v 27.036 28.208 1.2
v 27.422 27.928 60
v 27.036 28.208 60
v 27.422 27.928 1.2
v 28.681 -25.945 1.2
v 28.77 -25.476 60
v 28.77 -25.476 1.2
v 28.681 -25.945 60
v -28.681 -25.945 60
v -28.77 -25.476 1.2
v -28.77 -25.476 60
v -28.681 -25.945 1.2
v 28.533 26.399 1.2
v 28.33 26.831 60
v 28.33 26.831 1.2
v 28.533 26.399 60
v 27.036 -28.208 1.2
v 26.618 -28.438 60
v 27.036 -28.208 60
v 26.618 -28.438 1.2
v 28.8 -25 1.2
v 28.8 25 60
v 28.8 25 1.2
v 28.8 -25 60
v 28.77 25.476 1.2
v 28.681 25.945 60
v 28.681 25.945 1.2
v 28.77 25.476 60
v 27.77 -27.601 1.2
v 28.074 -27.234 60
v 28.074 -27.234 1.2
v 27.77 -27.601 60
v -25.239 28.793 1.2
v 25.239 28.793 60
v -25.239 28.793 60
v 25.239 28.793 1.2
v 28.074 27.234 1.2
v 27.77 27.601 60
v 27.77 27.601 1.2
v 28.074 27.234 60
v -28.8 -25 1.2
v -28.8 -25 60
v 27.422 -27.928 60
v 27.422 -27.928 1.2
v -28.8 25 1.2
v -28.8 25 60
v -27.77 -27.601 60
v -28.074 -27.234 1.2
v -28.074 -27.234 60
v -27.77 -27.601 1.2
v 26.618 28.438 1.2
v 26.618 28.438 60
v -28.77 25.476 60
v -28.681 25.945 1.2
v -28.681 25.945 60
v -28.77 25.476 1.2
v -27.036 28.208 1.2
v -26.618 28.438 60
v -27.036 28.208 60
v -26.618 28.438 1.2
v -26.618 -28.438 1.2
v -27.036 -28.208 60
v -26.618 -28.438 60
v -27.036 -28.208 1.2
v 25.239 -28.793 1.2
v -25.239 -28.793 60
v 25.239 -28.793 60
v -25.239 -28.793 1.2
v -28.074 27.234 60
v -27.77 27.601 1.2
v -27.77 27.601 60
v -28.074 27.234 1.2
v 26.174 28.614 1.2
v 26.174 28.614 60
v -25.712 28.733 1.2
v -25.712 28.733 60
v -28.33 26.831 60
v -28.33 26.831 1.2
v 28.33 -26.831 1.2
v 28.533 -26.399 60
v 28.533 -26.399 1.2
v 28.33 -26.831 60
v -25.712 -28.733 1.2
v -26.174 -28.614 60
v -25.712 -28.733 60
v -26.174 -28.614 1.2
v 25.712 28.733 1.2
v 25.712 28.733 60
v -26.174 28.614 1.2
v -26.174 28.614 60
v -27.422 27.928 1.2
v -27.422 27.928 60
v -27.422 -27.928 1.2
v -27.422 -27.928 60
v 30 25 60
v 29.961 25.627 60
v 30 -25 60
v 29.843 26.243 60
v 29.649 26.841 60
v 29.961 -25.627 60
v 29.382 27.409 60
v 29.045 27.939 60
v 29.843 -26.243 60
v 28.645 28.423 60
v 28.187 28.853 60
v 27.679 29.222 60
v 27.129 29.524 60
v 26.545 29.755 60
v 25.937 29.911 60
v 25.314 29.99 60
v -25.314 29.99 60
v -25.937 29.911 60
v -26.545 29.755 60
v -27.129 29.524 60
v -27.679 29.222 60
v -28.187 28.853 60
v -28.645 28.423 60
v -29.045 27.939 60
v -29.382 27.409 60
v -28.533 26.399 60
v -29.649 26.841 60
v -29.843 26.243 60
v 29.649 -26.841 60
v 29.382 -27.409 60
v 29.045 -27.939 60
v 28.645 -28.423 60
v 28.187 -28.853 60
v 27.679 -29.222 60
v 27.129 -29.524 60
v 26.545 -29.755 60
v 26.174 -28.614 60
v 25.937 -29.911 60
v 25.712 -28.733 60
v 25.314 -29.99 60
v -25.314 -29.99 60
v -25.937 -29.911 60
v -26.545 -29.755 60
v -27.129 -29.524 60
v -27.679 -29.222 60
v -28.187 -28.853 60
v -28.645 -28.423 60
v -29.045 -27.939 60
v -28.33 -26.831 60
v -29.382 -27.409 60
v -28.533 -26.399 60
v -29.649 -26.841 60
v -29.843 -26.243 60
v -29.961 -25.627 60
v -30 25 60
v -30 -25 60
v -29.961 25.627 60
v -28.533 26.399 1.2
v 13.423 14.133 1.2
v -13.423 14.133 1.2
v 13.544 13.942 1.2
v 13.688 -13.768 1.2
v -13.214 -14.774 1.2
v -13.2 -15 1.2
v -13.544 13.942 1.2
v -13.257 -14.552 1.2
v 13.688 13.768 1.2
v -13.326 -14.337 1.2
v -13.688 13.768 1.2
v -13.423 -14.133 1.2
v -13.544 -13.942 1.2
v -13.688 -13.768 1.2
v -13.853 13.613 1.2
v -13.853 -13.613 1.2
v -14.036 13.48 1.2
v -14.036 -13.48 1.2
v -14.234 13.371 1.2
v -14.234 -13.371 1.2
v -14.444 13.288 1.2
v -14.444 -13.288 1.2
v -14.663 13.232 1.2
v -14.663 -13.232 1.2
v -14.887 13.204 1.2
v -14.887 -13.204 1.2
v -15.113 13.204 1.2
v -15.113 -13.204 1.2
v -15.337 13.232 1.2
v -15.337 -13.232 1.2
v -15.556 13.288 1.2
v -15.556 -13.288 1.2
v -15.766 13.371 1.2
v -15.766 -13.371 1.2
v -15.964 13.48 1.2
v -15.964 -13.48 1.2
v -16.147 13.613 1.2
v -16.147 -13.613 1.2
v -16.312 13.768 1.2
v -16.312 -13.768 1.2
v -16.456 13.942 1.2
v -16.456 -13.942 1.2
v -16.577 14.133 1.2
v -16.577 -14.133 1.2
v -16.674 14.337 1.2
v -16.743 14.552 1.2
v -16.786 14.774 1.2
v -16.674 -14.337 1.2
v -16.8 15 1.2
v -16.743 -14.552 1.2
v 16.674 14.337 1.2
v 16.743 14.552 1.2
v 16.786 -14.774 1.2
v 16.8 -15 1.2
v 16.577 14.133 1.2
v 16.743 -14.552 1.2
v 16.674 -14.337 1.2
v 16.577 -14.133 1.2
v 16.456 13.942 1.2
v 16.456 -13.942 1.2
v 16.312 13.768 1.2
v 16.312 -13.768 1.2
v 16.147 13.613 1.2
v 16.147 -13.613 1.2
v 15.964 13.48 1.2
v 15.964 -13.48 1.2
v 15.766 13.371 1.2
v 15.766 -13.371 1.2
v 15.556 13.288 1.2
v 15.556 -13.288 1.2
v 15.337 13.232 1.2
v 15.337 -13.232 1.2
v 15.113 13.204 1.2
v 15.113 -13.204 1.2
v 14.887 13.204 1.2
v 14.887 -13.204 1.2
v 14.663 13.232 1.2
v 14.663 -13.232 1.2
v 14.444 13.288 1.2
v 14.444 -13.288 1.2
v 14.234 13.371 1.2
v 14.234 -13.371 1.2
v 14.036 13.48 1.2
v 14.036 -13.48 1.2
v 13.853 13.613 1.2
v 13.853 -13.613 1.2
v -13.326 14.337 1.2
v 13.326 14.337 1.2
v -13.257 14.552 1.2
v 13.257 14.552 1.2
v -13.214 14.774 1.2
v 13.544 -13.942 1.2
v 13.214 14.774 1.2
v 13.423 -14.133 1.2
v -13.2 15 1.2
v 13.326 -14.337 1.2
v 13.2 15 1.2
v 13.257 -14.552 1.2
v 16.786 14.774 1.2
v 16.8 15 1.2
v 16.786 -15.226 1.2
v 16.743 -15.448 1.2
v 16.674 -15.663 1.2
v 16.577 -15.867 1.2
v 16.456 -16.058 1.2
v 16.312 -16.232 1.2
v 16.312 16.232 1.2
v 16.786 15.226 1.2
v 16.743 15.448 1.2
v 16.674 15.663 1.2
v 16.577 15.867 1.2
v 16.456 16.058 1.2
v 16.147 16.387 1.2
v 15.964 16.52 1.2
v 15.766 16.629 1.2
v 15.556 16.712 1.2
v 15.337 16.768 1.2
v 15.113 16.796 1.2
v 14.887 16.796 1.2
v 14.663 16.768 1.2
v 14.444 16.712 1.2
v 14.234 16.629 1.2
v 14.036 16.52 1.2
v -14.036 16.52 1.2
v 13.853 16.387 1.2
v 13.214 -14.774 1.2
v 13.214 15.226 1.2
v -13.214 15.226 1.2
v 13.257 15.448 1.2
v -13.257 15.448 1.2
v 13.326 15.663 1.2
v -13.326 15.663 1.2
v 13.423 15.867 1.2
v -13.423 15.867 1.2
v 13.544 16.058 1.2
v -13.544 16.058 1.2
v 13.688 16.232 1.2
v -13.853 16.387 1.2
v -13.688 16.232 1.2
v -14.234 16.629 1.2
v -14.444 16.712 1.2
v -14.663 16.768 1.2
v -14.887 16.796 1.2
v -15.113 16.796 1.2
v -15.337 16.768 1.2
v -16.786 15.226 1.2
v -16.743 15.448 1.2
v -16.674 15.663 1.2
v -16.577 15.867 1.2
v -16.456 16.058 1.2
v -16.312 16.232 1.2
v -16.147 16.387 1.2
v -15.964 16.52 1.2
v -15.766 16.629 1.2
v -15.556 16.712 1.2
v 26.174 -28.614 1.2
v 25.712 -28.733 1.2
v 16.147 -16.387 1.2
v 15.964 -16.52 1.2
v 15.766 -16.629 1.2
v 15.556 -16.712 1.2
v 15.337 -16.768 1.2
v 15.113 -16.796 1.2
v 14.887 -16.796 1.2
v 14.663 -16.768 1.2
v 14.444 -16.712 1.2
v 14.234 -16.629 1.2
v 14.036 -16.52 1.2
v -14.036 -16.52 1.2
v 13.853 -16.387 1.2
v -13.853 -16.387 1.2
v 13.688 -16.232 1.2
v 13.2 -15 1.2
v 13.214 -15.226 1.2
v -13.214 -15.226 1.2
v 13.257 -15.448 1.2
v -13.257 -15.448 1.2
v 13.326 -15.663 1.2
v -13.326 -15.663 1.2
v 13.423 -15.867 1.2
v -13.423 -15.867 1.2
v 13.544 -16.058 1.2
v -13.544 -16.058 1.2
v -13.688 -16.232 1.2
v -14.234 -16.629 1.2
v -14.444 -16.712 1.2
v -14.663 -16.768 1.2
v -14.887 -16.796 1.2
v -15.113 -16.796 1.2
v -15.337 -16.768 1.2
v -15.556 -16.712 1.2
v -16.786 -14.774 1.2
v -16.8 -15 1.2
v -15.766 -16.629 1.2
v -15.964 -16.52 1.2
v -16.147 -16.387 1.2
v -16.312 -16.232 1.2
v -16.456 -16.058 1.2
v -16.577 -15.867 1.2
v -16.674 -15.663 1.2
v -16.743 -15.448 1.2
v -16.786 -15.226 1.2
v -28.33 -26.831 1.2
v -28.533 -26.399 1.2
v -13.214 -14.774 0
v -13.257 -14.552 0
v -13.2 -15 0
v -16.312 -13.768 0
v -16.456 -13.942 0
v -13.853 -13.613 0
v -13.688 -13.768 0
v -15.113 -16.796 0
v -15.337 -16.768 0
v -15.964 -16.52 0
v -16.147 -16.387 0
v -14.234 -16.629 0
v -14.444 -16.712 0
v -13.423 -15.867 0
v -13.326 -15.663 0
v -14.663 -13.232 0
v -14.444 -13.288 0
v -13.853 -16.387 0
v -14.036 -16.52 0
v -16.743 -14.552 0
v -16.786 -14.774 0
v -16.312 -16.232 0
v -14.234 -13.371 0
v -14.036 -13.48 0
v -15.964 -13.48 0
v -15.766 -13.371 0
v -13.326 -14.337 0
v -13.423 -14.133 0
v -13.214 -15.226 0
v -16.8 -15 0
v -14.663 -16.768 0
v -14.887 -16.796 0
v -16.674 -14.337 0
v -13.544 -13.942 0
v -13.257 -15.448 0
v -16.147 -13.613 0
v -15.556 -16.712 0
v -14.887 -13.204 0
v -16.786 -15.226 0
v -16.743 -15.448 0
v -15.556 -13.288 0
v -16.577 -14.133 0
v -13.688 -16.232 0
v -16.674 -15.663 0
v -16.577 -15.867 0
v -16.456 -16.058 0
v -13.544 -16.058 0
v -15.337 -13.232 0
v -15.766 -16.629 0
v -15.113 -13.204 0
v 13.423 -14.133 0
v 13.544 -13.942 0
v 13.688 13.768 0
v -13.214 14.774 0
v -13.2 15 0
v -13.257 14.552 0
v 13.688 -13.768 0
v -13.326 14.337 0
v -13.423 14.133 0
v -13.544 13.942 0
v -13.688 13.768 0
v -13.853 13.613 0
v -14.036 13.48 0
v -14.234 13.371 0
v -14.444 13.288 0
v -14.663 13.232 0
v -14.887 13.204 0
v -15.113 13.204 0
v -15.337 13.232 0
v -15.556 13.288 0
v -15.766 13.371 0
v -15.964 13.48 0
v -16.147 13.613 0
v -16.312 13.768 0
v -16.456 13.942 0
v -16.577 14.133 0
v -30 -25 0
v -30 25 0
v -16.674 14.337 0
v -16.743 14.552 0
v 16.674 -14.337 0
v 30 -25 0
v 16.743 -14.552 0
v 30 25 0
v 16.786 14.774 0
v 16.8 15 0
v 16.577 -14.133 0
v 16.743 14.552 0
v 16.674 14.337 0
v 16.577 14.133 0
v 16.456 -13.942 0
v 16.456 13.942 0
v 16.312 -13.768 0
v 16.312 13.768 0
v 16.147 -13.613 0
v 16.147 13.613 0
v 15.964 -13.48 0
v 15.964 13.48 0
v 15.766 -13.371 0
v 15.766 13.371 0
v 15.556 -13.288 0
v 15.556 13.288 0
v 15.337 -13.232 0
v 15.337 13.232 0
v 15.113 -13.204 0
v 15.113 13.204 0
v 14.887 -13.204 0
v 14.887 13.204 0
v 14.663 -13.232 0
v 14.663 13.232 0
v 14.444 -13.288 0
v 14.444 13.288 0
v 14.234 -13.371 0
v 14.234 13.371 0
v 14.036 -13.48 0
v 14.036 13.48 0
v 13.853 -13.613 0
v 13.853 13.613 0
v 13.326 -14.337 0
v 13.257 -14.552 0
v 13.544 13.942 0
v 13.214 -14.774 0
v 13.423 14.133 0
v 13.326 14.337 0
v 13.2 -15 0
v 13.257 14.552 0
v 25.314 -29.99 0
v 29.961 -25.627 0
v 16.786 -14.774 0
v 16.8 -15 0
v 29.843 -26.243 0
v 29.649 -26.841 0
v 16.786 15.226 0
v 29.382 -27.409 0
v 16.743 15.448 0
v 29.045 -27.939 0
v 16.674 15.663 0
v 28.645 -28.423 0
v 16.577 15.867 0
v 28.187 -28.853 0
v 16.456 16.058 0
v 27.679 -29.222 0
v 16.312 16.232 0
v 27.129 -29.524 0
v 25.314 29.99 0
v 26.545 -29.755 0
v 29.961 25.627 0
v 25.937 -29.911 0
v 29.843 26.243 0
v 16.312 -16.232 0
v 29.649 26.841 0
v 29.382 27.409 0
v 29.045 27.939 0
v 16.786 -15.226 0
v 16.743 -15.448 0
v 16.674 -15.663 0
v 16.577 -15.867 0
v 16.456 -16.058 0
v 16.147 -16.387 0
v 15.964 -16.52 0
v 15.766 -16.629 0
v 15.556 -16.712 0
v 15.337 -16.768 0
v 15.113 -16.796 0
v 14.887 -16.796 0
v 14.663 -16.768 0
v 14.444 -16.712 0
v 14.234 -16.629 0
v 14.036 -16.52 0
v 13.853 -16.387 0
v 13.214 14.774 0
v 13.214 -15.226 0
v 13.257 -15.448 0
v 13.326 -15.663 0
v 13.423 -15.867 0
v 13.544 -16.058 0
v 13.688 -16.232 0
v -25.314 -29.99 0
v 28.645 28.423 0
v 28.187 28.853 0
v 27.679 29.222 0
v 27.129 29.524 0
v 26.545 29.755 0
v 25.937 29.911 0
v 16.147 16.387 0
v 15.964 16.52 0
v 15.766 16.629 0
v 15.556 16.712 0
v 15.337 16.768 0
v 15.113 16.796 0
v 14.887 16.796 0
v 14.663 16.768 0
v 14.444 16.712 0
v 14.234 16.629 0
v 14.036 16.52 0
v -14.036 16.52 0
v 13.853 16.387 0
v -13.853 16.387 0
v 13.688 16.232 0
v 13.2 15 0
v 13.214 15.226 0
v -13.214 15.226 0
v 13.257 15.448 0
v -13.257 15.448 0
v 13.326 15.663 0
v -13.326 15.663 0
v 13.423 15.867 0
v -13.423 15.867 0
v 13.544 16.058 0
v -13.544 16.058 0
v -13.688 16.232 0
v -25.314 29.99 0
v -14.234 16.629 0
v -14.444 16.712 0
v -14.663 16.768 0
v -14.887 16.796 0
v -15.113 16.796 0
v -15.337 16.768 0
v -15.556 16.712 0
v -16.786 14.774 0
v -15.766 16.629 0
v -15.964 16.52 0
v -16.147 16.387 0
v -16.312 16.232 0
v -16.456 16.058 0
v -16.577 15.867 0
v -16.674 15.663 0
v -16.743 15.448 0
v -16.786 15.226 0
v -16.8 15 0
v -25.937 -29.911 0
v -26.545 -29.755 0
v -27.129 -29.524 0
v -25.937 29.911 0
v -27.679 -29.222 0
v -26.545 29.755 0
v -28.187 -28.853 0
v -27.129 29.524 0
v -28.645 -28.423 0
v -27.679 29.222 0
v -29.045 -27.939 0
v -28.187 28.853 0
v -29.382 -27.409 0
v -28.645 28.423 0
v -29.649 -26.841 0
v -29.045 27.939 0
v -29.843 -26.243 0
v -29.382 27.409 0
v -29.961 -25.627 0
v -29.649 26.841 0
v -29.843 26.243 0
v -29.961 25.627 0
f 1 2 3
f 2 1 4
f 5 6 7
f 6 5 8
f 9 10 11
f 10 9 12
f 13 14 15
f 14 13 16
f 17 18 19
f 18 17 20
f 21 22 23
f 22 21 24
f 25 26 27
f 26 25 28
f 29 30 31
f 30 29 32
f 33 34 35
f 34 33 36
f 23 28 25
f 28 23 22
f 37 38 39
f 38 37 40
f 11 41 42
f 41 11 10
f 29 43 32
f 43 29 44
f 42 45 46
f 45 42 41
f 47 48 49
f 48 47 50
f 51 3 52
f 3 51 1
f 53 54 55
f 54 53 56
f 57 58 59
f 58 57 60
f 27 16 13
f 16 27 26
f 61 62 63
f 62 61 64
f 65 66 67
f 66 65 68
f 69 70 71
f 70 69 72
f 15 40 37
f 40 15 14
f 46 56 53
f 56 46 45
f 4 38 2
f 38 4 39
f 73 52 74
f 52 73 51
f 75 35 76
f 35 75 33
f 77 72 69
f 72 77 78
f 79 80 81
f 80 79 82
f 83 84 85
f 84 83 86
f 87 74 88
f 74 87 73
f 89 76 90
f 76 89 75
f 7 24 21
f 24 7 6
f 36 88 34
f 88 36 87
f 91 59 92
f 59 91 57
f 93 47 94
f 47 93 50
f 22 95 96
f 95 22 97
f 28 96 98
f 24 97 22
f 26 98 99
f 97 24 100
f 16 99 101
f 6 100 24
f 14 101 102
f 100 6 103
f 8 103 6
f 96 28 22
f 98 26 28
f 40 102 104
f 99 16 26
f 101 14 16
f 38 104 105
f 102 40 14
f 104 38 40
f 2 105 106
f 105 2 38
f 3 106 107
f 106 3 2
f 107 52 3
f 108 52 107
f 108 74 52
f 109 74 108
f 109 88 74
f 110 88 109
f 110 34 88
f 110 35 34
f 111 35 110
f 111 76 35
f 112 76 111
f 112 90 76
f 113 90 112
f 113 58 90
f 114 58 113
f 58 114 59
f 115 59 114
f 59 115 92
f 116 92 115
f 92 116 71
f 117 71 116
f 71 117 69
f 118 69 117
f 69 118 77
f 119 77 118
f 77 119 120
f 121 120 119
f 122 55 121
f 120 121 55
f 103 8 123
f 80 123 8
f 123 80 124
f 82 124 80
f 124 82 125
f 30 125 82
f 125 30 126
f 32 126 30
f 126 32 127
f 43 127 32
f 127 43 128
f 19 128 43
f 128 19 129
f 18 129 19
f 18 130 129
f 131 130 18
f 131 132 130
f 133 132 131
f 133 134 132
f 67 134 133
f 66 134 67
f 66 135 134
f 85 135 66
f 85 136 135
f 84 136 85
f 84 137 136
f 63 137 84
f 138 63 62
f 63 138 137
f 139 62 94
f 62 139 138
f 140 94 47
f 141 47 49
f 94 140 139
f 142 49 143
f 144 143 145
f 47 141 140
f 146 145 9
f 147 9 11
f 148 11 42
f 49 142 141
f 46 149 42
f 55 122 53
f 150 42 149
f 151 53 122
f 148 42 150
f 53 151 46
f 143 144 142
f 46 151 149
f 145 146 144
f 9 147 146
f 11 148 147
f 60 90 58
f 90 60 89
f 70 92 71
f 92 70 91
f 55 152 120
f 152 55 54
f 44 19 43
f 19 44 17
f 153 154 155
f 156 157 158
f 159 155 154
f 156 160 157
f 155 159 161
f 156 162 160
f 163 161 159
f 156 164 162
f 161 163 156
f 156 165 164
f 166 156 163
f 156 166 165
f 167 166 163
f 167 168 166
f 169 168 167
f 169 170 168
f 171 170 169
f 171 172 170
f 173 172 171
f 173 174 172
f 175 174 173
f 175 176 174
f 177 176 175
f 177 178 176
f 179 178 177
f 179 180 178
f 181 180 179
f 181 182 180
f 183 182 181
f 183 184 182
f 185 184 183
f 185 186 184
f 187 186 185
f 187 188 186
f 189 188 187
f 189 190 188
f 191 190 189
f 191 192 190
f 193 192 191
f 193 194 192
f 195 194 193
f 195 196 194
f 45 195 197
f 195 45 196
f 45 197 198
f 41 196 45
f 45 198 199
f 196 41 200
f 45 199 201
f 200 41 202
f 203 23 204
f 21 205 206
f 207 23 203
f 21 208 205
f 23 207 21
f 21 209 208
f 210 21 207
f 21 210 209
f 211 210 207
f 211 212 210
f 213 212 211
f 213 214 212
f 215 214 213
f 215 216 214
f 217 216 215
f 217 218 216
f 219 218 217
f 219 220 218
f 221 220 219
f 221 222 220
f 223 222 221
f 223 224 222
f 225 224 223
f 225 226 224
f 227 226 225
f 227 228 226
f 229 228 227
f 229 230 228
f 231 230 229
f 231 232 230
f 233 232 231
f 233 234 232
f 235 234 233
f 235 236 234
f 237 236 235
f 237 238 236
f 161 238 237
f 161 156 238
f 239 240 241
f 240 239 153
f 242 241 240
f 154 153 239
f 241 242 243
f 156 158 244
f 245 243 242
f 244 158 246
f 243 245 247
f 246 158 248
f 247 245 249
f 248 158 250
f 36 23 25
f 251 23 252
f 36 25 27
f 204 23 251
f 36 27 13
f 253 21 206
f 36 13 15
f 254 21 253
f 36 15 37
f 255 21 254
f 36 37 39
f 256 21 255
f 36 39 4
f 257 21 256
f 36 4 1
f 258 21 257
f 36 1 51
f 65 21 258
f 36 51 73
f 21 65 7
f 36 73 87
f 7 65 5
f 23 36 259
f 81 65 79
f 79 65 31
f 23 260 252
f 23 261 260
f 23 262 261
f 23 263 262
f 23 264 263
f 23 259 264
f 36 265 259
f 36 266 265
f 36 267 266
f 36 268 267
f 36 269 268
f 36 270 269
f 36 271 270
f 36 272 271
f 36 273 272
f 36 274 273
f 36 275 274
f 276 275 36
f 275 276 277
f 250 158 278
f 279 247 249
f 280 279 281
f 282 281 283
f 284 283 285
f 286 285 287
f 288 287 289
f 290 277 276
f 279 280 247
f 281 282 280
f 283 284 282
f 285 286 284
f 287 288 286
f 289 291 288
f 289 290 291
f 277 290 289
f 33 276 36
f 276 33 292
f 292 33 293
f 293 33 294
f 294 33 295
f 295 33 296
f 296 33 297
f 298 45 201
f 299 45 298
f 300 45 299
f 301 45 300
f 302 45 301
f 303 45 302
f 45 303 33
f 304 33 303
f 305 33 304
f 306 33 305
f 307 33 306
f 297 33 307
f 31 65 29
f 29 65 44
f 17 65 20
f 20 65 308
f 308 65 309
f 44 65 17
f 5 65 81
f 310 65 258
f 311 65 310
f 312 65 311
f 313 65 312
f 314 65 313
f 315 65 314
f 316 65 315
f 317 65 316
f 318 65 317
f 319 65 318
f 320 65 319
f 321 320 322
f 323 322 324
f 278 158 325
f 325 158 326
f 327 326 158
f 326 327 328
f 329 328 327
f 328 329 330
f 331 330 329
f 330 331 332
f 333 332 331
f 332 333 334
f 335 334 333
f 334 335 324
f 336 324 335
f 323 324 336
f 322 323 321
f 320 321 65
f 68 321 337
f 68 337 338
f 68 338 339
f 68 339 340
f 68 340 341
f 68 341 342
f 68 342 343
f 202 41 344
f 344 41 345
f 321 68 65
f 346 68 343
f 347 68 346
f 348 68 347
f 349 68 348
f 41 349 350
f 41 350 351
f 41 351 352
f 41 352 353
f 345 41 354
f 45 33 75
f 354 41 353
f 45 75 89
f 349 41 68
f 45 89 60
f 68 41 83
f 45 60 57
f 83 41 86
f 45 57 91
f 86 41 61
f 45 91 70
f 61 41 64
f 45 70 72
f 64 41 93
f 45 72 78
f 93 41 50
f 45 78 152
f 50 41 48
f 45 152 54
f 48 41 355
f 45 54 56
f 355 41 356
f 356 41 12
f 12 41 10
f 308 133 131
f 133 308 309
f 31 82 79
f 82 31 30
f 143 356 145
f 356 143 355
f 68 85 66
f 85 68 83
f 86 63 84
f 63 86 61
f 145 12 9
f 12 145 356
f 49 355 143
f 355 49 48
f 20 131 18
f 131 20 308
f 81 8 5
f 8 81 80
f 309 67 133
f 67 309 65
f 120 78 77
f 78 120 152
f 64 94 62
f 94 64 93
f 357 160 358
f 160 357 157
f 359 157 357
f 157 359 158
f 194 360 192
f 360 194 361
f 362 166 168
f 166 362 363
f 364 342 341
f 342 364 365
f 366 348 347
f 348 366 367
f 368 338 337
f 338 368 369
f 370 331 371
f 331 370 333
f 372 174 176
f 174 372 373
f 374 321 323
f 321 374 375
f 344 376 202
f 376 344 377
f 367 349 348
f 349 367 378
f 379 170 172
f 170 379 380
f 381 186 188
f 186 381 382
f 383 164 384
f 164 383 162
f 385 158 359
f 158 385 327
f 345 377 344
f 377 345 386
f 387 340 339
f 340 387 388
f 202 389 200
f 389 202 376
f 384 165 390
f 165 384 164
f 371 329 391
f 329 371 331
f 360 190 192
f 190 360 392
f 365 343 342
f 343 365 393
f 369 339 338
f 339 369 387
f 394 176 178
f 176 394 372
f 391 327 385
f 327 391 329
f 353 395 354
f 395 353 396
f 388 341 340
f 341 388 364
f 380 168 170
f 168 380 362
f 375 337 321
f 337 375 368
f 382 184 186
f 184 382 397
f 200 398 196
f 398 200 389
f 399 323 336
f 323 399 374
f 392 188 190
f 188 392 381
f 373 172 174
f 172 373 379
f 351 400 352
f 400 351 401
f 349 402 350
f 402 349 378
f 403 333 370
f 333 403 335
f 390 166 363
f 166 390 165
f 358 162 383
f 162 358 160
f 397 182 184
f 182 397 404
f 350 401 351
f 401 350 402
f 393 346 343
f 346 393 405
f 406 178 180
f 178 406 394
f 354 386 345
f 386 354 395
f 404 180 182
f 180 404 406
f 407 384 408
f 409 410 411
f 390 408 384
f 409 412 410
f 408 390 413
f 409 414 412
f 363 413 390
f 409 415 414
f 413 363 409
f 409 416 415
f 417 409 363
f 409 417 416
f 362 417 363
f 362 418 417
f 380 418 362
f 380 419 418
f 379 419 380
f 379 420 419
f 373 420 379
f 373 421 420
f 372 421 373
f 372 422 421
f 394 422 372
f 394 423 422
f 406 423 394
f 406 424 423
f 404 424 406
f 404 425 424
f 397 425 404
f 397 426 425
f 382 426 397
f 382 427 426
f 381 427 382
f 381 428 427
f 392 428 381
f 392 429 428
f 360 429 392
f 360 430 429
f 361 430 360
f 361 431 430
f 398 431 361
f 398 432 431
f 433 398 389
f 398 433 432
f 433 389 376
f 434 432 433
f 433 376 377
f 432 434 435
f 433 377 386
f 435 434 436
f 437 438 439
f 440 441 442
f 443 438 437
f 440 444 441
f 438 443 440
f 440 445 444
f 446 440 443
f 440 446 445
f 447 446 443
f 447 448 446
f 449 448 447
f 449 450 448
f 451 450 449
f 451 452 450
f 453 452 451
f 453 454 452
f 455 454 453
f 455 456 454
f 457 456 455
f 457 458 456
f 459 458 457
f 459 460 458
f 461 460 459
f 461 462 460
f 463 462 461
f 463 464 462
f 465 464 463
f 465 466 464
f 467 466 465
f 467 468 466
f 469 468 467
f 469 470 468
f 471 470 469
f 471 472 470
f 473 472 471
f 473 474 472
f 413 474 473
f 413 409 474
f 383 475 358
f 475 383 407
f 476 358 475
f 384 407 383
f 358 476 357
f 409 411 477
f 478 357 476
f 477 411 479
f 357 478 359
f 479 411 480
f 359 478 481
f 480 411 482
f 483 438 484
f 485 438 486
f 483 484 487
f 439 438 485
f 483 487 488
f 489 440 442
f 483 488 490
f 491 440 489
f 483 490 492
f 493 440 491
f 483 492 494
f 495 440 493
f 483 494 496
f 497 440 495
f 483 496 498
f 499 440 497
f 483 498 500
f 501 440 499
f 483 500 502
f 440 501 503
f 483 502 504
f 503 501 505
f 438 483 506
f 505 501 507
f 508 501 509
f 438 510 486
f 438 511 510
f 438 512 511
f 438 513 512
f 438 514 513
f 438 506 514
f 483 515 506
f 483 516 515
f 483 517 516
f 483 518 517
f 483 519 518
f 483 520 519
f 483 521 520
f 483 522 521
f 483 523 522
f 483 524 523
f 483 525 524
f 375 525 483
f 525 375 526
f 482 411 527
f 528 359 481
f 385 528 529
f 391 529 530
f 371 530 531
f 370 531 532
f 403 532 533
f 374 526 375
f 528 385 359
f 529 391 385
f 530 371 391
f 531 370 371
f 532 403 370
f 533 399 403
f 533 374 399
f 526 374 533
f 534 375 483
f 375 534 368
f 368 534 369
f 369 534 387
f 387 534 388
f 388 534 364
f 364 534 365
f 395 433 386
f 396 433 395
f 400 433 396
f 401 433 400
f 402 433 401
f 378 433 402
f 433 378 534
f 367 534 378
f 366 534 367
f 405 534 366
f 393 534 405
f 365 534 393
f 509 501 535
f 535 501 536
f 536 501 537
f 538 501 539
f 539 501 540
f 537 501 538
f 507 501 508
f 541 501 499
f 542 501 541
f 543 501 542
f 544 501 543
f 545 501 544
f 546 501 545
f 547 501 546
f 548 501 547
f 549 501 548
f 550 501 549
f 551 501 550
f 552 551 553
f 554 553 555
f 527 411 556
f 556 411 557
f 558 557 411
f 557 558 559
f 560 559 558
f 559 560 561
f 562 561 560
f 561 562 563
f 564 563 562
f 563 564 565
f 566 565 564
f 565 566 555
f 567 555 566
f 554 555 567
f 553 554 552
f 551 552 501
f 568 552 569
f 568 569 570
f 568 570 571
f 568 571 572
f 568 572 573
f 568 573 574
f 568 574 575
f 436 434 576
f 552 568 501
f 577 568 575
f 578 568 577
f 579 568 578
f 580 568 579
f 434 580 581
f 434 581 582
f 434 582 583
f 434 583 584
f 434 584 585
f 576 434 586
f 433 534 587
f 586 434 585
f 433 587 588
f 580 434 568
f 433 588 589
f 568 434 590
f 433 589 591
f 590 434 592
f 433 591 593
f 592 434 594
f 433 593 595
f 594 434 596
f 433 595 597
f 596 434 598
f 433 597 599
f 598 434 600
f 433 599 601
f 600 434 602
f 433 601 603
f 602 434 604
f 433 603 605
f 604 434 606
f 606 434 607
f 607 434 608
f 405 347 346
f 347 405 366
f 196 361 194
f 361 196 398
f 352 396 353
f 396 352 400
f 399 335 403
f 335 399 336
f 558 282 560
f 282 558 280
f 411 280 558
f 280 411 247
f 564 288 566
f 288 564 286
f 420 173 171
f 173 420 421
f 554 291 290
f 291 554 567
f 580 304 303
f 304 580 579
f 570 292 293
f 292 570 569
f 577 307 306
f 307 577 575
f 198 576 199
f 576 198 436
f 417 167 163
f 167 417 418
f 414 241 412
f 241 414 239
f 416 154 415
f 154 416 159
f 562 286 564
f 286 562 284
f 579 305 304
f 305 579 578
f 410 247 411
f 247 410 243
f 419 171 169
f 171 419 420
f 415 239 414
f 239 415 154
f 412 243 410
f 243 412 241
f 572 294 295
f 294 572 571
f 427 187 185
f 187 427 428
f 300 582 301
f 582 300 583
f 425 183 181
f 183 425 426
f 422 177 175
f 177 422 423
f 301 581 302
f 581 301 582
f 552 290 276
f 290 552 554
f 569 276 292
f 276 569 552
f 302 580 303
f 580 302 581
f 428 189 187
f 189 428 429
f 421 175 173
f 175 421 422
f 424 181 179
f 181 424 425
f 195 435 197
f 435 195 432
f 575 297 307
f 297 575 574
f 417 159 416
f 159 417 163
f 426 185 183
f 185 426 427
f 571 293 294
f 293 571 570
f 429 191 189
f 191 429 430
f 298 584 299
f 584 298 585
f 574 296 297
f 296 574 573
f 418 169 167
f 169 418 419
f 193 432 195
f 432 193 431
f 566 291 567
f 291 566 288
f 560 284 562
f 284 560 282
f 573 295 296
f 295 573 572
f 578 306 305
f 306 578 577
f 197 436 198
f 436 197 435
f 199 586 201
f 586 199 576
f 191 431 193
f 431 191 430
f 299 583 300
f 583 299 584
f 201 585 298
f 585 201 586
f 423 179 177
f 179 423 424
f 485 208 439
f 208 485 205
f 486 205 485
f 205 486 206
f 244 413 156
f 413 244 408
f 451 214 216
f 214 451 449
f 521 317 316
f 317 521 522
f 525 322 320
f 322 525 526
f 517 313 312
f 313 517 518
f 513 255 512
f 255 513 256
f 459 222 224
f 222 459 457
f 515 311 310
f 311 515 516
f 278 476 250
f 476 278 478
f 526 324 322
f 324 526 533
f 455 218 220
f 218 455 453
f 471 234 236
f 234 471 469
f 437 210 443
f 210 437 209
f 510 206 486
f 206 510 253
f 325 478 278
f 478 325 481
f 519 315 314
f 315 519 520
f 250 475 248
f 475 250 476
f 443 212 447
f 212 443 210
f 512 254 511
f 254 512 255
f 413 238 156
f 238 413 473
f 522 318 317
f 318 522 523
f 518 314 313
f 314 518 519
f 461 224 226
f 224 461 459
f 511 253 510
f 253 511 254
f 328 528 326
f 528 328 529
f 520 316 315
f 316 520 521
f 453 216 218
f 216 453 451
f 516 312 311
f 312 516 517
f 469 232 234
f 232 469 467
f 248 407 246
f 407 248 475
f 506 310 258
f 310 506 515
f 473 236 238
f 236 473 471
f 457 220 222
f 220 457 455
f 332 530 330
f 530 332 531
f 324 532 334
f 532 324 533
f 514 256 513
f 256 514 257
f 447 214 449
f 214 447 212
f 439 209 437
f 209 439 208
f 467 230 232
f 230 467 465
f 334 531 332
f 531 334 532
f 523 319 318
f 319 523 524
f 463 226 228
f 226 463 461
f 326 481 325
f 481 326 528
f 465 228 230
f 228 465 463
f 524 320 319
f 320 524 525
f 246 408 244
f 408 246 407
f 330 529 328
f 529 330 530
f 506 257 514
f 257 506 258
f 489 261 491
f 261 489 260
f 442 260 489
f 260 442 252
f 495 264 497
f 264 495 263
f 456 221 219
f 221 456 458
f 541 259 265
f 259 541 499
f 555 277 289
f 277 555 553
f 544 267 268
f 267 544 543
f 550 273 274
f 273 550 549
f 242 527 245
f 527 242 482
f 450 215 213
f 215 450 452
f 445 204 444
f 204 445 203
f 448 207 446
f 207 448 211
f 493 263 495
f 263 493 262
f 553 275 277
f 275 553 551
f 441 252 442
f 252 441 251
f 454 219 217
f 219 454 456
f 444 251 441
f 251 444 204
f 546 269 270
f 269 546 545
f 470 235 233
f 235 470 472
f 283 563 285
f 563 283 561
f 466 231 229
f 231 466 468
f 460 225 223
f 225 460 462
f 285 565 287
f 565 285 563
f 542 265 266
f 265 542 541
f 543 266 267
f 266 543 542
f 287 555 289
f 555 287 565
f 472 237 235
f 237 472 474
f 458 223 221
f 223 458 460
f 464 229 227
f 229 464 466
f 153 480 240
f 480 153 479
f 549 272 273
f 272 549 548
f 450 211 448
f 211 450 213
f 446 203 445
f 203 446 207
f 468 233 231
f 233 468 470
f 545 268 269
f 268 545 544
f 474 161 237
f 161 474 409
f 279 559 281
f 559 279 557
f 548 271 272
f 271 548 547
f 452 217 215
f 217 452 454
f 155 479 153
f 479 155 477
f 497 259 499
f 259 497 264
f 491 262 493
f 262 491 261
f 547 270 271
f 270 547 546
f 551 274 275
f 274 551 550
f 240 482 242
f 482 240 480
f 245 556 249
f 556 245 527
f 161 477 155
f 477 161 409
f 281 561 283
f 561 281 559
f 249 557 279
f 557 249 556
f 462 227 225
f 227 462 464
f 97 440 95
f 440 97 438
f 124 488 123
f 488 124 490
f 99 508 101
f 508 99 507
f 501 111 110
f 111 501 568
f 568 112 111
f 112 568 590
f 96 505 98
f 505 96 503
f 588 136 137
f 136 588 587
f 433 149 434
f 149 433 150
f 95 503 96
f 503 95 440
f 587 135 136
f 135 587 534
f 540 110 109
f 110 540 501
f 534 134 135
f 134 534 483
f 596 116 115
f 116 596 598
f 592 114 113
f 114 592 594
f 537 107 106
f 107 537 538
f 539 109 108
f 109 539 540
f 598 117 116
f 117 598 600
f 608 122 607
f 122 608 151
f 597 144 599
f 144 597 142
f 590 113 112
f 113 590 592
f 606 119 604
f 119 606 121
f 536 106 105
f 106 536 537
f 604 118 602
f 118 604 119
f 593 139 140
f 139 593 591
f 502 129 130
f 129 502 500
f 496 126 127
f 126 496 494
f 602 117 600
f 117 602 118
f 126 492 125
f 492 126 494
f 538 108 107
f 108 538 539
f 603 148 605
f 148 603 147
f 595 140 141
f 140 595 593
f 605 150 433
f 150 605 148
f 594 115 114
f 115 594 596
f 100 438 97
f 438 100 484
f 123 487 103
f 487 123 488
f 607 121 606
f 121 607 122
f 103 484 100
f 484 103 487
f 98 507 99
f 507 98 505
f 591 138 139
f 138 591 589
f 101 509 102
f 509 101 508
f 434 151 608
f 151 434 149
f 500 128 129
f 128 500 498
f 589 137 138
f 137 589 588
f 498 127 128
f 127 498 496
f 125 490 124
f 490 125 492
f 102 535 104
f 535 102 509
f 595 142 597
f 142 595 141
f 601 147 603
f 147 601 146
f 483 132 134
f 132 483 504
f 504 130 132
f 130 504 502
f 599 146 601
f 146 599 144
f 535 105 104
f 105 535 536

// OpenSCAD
$fn = 50;


difference() {
	union() {
		hull() {
			translate(v = [-25.0000000000, 25.0000000000, 0]) {
				cylinder(h = 60, r = 5);
			}
			translate(v = [25.0000000000, 25.0000000000, 0]) {
				cylinder(h = 60, r = 5);
			}
			translate(v = [-25.0000000000, -25.0000000000, 0]) {
				cylinder(h = 60, r = 5);
			}
			translate(v = [25.0000000000, -25.0000000000, 0]) {
				cylinder(h = 60, r = 5);
			}
		}
	}
	union() {
		translate(v = [0, 0, 1.2000000000]) {
			hull() {
				translate(v = [-25.0000000000, 25.0000000000, 0]) {
					cylinder(h = 58.8000000000, r = 3.8000000000);
				}
				translate(v = [25.0000000000, 25.0000000000, 0]) {
					cylinder(h = 58.8000000000, r = 3.8000000000);
				}
				translate(v = [-25.0000000000, -25.0000000000, 0]) {
					cylinder(h = 58.8000000000, r = 3.8000000000);
				}
				translate(v = [25.0000000000, -25.0000000000, 0]) {
					cylinder(h = 58.8000000000, r = 3.8000000000);
				}
			}
		}
		#translate(v = [-15.0000000000, -15.0000000000, 0]) {
			cylinder(h = 1.2000000000, r = 1.8000000000);
		}
		#translate(v = [-15.0000000000, 15.0000000000, 0]) {
			cylinder(h = 1.2000000000, r = 1.8000000000);
		}
		#translate(v = [15.0000000000, -15.0000000000, 0]) {
			cylinder(h = 1.2000000000, r = 1.8000000000);
		}
		#translate(v = [15.0000000000, 15.0000000000, 0]) {
			cylinder(h = 1.2000000000, r = 1.8000000000);
		}
	}
}
